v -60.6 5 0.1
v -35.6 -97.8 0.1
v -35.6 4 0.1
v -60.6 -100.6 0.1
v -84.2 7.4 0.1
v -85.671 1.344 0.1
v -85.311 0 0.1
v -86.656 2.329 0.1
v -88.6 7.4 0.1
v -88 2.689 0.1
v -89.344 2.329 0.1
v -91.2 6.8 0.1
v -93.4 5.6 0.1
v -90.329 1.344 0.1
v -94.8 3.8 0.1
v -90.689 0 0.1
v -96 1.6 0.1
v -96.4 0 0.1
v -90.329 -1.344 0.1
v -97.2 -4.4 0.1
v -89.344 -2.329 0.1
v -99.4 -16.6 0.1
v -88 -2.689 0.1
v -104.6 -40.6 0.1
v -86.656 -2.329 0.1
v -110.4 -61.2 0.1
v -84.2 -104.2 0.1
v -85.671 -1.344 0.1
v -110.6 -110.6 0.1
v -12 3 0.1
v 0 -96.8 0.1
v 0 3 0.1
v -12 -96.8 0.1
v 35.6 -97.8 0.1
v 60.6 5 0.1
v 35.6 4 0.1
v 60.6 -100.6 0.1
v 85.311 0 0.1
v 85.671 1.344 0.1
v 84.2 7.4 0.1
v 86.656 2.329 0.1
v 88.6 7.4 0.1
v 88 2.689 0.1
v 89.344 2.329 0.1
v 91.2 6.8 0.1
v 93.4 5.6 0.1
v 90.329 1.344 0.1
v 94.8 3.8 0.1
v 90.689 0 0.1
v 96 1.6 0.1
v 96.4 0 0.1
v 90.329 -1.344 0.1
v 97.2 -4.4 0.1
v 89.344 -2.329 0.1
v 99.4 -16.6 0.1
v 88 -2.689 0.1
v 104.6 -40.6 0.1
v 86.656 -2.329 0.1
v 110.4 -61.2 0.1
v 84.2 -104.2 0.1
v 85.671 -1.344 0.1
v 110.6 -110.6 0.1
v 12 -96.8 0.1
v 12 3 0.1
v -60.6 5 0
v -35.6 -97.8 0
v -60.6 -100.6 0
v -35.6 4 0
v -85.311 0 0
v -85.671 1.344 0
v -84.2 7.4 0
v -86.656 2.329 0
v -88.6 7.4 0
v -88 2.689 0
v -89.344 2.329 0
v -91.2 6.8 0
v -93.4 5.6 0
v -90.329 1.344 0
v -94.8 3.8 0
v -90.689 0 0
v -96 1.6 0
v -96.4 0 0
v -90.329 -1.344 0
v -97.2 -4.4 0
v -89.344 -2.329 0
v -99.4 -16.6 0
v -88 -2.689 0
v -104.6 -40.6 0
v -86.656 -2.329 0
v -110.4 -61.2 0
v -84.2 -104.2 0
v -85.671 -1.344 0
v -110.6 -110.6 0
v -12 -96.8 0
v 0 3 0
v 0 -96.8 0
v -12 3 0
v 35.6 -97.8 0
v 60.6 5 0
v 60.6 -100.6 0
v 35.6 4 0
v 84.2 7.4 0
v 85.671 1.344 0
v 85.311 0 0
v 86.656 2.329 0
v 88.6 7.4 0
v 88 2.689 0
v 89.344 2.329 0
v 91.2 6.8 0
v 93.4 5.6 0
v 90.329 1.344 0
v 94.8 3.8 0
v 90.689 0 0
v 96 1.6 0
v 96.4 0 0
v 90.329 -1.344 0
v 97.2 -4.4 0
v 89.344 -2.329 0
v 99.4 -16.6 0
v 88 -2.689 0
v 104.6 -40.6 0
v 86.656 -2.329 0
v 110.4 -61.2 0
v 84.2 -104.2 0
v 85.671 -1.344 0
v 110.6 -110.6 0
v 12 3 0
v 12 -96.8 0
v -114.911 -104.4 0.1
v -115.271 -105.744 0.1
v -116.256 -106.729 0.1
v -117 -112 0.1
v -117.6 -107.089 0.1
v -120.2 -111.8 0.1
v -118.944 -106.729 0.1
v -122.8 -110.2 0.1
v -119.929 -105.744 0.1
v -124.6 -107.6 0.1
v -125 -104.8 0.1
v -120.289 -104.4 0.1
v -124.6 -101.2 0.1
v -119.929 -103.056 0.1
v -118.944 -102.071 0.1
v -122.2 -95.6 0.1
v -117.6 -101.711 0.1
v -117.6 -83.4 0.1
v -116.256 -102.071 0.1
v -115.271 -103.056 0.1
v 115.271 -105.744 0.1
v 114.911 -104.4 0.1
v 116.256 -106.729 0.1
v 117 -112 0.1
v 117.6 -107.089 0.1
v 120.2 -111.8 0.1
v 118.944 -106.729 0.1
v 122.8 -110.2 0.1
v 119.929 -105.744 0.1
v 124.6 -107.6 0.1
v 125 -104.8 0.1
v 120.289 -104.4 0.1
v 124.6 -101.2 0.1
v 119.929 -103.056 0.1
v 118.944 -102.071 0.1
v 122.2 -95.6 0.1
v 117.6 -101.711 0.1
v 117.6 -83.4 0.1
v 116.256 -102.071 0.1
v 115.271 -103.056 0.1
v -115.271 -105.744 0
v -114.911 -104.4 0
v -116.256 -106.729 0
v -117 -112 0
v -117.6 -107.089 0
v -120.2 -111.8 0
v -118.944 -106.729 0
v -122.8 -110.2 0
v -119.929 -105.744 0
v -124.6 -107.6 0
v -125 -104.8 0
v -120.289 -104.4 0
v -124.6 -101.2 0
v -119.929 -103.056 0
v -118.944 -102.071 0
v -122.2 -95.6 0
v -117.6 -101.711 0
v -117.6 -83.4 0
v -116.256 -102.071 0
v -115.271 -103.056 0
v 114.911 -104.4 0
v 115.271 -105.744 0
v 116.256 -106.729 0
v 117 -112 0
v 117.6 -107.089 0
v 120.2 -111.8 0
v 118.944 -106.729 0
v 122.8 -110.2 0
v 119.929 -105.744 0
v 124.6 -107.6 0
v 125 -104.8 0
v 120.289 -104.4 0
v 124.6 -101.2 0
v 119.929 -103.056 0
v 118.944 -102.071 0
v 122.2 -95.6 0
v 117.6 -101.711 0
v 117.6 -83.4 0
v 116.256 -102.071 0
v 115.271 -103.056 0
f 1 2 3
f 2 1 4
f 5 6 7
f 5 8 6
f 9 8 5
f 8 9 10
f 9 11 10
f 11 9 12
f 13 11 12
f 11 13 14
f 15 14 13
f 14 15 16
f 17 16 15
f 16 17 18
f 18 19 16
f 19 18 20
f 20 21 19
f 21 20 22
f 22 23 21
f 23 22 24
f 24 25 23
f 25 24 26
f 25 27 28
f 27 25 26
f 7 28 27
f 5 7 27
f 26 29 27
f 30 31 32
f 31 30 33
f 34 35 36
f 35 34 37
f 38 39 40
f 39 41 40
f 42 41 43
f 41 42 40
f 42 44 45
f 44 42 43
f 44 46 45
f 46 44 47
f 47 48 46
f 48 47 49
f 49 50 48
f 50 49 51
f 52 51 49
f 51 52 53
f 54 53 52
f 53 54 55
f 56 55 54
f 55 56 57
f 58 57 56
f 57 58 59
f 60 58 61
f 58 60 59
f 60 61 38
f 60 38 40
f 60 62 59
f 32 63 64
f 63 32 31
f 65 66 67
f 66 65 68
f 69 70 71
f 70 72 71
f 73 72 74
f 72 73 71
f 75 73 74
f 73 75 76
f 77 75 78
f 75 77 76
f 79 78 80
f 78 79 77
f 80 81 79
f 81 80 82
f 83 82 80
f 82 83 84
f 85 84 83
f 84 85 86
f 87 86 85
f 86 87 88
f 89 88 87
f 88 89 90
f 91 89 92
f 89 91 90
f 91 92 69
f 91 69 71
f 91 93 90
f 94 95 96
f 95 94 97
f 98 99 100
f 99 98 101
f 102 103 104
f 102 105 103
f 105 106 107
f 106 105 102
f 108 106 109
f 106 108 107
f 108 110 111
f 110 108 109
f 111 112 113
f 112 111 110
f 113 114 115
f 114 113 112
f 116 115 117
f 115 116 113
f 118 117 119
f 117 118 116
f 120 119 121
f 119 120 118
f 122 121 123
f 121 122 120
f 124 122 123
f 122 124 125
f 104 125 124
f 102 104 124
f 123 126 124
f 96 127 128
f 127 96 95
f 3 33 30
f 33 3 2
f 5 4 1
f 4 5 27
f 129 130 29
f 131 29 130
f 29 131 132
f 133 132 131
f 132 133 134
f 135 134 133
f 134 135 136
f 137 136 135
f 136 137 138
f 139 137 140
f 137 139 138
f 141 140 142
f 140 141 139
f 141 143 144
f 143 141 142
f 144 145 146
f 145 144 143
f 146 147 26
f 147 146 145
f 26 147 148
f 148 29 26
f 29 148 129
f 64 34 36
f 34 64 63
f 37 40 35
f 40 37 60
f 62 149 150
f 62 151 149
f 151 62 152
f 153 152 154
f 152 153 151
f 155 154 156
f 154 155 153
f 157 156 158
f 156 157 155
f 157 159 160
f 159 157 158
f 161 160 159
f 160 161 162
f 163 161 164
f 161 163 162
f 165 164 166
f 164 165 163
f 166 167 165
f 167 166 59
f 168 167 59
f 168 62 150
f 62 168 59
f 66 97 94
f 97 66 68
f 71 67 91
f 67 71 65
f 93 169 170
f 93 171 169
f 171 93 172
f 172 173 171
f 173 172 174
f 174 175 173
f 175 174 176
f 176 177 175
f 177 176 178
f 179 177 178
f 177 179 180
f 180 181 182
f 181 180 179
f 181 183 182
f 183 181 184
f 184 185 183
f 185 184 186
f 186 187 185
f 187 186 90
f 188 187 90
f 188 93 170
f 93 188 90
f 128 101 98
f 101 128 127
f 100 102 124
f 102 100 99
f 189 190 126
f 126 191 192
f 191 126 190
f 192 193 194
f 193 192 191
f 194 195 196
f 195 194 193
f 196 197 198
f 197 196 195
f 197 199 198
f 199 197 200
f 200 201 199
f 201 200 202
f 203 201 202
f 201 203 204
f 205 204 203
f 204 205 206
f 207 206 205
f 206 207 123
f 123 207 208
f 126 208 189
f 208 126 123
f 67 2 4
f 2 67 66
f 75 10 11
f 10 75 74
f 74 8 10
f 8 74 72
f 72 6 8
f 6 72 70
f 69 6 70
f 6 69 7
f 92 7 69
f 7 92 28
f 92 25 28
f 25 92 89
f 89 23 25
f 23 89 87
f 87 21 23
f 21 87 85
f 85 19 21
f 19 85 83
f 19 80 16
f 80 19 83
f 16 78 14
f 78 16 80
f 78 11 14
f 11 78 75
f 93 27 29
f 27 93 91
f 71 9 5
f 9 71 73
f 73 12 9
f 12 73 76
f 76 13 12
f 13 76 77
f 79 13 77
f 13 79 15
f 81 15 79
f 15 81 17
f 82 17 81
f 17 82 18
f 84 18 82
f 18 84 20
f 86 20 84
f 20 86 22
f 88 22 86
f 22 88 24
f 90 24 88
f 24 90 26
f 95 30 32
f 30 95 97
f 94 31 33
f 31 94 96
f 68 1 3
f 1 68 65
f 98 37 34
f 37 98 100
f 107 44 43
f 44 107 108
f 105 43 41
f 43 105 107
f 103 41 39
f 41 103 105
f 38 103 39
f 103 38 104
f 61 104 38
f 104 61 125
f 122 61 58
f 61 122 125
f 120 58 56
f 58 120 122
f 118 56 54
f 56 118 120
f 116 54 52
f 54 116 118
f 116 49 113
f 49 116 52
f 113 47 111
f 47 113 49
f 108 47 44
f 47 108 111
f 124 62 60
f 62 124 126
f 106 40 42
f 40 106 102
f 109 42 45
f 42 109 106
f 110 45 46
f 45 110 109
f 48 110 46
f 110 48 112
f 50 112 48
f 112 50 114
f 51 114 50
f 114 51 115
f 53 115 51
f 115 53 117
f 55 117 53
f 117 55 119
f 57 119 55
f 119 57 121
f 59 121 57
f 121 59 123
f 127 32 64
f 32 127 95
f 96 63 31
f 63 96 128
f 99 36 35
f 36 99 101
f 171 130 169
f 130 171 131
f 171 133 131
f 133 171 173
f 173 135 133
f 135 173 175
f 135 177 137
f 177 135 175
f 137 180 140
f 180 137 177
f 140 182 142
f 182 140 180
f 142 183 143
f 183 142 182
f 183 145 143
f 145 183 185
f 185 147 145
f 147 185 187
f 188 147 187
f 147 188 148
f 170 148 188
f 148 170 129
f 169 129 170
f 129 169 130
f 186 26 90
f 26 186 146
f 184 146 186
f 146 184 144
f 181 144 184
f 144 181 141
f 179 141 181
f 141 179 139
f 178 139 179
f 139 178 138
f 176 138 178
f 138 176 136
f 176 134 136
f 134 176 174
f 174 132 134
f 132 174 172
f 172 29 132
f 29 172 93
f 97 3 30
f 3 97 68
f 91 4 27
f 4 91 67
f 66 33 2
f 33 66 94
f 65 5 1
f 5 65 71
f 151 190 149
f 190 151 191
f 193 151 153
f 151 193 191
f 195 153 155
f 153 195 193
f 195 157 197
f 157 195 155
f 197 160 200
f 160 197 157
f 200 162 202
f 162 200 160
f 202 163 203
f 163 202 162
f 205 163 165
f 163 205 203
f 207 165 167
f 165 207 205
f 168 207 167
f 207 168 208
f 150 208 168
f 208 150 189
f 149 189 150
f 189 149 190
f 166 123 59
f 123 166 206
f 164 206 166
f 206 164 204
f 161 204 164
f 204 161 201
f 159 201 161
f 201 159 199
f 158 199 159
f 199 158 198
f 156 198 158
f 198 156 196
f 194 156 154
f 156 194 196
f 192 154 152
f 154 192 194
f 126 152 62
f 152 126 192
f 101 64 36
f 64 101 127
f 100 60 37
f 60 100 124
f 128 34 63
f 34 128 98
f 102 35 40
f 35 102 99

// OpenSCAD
use <../lib.scad>
use <s/u9495s01.scad>
use <s/u9495s02.scad>
use <s/u9495s03.scad>
use <s/u9495s04.scad>
$fa=1; $fs=0.2;
function ldraw_lib__u9495p01(realsolid=false) = [
// 0 Sheet Fabric 30 x 15 Trapezoidal Sail with Thick Stripes on White Background Pattern
// 0 Name: u9495p01.dat
// 0 Author: Philippe Hurbain [Philo]
// 0 !LDRAW_ORG Part UPDATE 2022-03
// 0 !LICENSE Licensed under CC BY 2.0 and CC BY 4.0 : see CAreadme.txt
// 
// 0 BFC CERTIFY CCW
  [0,"BFC","CERTIFY"],
  [0,"BFC","CCW"],
// 
// 0 !CATEGORY Sheet Fabric
// 0 !KEYWORDS Black Seas Barracuda, Caribbean Clipper, set 10040, Set 6274
// 0 !KEYWORDS set 6285, set 6286, Skull's Eye Schooner
// 
// 0 !HISTORY 2022-05-07 [PTadmin] Official Update 2022-03
// 
// 
// 1 16 0 -0.25 0 1 0 0 0 1 0 0 0 1 s\u9495s01.dat
  [1,16,0,-0.25,0,1,0,0,0,1,0,0,0,1, ldraw_lib__s__u9495s01(realsolid)],
// 1 16 0 -0.25 0 -1 0 0 0 1 0 0 0 1 s\u9495s01.dat
  [1,16,0,-0.25,0,-1,0,0,0,1,0,0,0,1, ldraw_lib__s__u9495s01(realsolid)],
// 1 16 0 0 0 1 0 0 0 -1 0 0 0 1 s\u9495s01.dat
  [1,16,0,0,0,1,0,0,0,-1,0,0,0,1, ldraw_lib__s__u9495s01(realsolid)],
// 1 16 0 0 0 -1 0 0 0 -1 0 0 0 1 s\u9495s01.dat
  [1,16,0,0,0,-1,0,0,0,-1,0,0,0,1, ldraw_lib__s__u9495s01(realsolid)],
// 
// 1 15 0 -0.25 0 1 0 0 0 1 0 0 0 1 s\u9495s02.dat
  [1,15,0,-0.25,0,1,0,0,0,1,0,0,0,1, ldraw_lib__s__u9495s02(realsolid)],
// 1 15 0 -0.25 0 -1 0 0 0 1 0 0 0 1 s\u9495s02.dat
  [1,15,0,-0.25,0,-1,0,0,0,1,0,0,0,1, ldraw_lib__s__u9495s02(realsolid)],
// 1 15 0 0 0 1 0 0 0 -1 0 0 0 1 s\u9495s02.dat
  [1,15,0,0,0,1,0,0,0,-1,0,0,0,1, ldraw_lib__s__u9495s02(realsolid)],
// 1 15 0 0 0 -1 0 0 0 -1 0 0 0 1 s\u9495s02.dat
  [1,15,0,0,0,-1,0,0,0,-1,0,0,0,1, ldraw_lib__s__u9495s02(realsolid)],
// 
// 1 16 0 0 0 1 0 0 0 1 0 0 0 1 s\u9495s03.dat
  [1,16,0,0,0,1,0,0,0,1,0,0,0,1, ldraw_lib__s__u9495s03(realsolid)],
// 1 16 0 0 0 -1 0 0 0 1 0 0 0 1 s\u9495s03.dat
  [1,16,0,0,0,-1,0,0,0,1,0,0,0,1, ldraw_lib__s__u9495s03(realsolid)],
// 
// 1 15 0 0 0 1 0 0 0 1 0 0 0 1 s\u9495s04.dat
  [1,15,0,0,0,1,0,0,0,1,0,0,0,1, ldraw_lib__s__u9495s04(realsolid)],
// 1 15 0 0 0 -1 0 0 0 1 0 0 0 1 s\u9495s04.dat
  [1,15,0,0,0,-1,0,0,0,1,0,0,0,1, ldraw_lib__s__u9495s04(realsolid)],
];
module ldraw_lib__u9495p01(step=0, col=false, unit=2/5, alt=false, line=0.2, solid=!$preview)
    makepoly(ldraw_lib__u9495p01(solid), step=step, col=col, unit=unit, alt=alt, line=line, solid=solid);
ldraw_lib__u9495p01(line=0.2);
